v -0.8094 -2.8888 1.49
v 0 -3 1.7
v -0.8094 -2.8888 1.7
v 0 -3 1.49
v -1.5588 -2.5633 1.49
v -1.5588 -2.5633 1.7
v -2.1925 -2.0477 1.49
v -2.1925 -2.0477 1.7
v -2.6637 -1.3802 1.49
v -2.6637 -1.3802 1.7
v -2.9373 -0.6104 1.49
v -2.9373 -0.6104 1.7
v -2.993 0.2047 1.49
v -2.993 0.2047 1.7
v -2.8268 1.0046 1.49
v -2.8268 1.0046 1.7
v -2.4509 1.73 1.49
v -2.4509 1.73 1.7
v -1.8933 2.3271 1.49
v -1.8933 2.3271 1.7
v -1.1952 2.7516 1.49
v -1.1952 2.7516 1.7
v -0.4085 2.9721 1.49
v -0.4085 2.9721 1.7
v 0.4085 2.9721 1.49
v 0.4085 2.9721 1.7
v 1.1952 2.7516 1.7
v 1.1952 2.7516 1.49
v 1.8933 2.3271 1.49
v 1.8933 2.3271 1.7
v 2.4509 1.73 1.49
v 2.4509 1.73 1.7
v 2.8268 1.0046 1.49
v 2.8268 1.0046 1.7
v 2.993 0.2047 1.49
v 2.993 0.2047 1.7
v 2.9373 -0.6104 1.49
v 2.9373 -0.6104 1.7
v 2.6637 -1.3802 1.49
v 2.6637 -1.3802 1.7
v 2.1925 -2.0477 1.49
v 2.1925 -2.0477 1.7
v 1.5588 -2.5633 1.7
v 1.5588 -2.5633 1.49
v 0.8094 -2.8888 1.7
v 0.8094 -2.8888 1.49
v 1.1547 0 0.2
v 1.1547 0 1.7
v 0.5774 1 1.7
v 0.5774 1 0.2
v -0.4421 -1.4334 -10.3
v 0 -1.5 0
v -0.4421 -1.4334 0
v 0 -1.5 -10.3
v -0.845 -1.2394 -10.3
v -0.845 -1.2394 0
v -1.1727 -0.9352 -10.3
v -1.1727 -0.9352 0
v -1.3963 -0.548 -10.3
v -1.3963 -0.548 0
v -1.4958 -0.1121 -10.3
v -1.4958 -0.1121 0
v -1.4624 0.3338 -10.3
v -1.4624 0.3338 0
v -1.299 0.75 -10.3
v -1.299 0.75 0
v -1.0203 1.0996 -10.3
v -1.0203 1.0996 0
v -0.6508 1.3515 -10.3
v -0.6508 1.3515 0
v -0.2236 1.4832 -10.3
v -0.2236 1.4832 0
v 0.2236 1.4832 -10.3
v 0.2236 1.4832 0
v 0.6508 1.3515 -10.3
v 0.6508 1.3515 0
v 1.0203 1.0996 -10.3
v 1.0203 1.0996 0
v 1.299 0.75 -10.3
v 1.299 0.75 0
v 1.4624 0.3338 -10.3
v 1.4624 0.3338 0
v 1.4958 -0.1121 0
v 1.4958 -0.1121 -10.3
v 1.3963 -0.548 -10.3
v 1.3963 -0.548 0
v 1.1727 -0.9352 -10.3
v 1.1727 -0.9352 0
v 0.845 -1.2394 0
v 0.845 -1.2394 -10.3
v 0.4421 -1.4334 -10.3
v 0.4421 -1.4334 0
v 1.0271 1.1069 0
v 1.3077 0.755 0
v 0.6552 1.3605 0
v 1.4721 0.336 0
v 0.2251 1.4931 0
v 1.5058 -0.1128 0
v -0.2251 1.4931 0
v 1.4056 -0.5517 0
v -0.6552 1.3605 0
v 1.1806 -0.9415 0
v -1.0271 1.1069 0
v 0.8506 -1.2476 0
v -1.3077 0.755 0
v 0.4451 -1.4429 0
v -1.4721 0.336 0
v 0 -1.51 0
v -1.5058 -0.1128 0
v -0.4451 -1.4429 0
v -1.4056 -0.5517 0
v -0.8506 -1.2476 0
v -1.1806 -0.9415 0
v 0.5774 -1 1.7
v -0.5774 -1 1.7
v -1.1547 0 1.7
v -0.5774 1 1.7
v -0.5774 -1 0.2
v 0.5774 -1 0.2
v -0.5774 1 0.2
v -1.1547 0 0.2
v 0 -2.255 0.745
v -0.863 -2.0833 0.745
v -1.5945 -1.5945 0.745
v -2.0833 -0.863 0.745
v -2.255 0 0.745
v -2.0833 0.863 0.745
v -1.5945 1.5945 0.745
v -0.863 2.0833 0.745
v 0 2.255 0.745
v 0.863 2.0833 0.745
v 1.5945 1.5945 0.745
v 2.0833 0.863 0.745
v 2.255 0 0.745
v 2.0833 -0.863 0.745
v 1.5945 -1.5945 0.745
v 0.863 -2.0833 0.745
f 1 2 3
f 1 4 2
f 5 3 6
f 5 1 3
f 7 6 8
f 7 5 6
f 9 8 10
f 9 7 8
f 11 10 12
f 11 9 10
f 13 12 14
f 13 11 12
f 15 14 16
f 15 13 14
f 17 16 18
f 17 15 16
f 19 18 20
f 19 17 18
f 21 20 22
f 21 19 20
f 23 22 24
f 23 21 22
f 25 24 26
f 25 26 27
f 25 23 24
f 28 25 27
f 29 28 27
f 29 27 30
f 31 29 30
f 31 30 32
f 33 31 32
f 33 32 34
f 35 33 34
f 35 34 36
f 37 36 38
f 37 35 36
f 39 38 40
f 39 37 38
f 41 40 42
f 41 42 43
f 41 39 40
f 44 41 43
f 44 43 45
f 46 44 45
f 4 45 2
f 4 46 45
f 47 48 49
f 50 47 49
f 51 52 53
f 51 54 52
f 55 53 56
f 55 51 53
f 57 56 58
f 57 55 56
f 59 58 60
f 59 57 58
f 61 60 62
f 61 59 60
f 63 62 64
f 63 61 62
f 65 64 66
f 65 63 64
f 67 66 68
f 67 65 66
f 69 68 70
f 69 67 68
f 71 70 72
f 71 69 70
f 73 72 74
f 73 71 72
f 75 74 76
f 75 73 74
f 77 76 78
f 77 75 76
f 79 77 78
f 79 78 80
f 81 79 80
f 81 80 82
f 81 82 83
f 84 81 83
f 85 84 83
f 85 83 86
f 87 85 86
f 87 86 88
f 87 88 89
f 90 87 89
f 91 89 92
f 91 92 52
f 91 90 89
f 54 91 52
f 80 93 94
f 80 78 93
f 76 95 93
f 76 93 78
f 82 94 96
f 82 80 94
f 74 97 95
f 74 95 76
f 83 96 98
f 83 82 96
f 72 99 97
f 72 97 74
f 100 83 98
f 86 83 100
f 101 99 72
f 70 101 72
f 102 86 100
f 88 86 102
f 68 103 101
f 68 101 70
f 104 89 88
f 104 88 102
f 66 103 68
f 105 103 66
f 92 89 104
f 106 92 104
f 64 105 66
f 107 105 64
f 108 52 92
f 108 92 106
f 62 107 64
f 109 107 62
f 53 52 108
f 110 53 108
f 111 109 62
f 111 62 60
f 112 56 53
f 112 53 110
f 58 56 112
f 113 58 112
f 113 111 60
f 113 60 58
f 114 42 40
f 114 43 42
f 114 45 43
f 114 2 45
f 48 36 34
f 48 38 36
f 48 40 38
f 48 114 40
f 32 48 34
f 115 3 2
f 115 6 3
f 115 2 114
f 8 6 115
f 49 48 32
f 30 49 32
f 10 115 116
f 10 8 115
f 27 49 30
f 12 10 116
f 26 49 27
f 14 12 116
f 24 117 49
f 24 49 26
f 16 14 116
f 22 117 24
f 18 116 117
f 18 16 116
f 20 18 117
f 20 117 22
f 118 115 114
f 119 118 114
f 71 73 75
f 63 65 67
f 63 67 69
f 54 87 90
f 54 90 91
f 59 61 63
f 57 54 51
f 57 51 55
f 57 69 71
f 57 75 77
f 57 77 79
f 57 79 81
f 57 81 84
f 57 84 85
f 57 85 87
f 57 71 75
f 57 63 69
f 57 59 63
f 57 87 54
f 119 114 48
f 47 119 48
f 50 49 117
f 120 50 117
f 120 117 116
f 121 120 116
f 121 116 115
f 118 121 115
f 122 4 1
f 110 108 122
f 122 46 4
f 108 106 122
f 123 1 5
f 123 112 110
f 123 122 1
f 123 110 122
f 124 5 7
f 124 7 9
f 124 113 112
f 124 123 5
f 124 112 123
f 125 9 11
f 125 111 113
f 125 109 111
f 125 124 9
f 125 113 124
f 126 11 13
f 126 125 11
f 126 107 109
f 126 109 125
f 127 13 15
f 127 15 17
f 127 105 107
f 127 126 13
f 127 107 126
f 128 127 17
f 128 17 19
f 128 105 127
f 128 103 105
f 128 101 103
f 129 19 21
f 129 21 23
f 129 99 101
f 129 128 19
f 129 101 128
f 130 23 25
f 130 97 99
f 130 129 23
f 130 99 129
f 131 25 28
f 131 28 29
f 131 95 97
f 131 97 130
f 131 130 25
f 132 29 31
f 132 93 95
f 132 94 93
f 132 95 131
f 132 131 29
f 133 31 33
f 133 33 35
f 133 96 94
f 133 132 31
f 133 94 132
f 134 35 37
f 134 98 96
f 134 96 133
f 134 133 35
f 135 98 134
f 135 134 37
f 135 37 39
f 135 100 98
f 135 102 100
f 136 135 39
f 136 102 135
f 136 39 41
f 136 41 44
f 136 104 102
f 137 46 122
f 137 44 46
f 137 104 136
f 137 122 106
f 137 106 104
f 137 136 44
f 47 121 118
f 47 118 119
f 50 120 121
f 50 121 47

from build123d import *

# Parameters (mm, degrees)
CUT_EXTRUDE1_DEPTH = 1.5


with BuildPart() as part:
    # Sketch1 → Revolve1 (revolve)
    with BuildSketch(Plane(origin=(0, 0, 0), x_dir=(0, 0, -1), z_dir=(1, 0, 0))):
        Polygon((-1.7, 0), (-1.7, 3), (-1.49, 3), (0, 1.51), (0, 1.5), (10.3, 1.5), (10.3, 0), align=None)
    revolve(axis=Axis((0, 0, 5.584882278), (0, 0, -1)))

    # Sketch2 → Cut-Extrude1 (cut)
    with BuildSketch(Plane.XY.offset(1.7)):
        Polygon((0.577350269, -1), (1.154700538, 0), (0.577350269, 1), (-0.577350269, 1), (-1.154700538, 0), (-0.577350269, -1), align=None)
    extrude(amount=-CUT_EXTRUDE1_DEPTH, mode=Mode.SUBTRACT)


solid = part.part
